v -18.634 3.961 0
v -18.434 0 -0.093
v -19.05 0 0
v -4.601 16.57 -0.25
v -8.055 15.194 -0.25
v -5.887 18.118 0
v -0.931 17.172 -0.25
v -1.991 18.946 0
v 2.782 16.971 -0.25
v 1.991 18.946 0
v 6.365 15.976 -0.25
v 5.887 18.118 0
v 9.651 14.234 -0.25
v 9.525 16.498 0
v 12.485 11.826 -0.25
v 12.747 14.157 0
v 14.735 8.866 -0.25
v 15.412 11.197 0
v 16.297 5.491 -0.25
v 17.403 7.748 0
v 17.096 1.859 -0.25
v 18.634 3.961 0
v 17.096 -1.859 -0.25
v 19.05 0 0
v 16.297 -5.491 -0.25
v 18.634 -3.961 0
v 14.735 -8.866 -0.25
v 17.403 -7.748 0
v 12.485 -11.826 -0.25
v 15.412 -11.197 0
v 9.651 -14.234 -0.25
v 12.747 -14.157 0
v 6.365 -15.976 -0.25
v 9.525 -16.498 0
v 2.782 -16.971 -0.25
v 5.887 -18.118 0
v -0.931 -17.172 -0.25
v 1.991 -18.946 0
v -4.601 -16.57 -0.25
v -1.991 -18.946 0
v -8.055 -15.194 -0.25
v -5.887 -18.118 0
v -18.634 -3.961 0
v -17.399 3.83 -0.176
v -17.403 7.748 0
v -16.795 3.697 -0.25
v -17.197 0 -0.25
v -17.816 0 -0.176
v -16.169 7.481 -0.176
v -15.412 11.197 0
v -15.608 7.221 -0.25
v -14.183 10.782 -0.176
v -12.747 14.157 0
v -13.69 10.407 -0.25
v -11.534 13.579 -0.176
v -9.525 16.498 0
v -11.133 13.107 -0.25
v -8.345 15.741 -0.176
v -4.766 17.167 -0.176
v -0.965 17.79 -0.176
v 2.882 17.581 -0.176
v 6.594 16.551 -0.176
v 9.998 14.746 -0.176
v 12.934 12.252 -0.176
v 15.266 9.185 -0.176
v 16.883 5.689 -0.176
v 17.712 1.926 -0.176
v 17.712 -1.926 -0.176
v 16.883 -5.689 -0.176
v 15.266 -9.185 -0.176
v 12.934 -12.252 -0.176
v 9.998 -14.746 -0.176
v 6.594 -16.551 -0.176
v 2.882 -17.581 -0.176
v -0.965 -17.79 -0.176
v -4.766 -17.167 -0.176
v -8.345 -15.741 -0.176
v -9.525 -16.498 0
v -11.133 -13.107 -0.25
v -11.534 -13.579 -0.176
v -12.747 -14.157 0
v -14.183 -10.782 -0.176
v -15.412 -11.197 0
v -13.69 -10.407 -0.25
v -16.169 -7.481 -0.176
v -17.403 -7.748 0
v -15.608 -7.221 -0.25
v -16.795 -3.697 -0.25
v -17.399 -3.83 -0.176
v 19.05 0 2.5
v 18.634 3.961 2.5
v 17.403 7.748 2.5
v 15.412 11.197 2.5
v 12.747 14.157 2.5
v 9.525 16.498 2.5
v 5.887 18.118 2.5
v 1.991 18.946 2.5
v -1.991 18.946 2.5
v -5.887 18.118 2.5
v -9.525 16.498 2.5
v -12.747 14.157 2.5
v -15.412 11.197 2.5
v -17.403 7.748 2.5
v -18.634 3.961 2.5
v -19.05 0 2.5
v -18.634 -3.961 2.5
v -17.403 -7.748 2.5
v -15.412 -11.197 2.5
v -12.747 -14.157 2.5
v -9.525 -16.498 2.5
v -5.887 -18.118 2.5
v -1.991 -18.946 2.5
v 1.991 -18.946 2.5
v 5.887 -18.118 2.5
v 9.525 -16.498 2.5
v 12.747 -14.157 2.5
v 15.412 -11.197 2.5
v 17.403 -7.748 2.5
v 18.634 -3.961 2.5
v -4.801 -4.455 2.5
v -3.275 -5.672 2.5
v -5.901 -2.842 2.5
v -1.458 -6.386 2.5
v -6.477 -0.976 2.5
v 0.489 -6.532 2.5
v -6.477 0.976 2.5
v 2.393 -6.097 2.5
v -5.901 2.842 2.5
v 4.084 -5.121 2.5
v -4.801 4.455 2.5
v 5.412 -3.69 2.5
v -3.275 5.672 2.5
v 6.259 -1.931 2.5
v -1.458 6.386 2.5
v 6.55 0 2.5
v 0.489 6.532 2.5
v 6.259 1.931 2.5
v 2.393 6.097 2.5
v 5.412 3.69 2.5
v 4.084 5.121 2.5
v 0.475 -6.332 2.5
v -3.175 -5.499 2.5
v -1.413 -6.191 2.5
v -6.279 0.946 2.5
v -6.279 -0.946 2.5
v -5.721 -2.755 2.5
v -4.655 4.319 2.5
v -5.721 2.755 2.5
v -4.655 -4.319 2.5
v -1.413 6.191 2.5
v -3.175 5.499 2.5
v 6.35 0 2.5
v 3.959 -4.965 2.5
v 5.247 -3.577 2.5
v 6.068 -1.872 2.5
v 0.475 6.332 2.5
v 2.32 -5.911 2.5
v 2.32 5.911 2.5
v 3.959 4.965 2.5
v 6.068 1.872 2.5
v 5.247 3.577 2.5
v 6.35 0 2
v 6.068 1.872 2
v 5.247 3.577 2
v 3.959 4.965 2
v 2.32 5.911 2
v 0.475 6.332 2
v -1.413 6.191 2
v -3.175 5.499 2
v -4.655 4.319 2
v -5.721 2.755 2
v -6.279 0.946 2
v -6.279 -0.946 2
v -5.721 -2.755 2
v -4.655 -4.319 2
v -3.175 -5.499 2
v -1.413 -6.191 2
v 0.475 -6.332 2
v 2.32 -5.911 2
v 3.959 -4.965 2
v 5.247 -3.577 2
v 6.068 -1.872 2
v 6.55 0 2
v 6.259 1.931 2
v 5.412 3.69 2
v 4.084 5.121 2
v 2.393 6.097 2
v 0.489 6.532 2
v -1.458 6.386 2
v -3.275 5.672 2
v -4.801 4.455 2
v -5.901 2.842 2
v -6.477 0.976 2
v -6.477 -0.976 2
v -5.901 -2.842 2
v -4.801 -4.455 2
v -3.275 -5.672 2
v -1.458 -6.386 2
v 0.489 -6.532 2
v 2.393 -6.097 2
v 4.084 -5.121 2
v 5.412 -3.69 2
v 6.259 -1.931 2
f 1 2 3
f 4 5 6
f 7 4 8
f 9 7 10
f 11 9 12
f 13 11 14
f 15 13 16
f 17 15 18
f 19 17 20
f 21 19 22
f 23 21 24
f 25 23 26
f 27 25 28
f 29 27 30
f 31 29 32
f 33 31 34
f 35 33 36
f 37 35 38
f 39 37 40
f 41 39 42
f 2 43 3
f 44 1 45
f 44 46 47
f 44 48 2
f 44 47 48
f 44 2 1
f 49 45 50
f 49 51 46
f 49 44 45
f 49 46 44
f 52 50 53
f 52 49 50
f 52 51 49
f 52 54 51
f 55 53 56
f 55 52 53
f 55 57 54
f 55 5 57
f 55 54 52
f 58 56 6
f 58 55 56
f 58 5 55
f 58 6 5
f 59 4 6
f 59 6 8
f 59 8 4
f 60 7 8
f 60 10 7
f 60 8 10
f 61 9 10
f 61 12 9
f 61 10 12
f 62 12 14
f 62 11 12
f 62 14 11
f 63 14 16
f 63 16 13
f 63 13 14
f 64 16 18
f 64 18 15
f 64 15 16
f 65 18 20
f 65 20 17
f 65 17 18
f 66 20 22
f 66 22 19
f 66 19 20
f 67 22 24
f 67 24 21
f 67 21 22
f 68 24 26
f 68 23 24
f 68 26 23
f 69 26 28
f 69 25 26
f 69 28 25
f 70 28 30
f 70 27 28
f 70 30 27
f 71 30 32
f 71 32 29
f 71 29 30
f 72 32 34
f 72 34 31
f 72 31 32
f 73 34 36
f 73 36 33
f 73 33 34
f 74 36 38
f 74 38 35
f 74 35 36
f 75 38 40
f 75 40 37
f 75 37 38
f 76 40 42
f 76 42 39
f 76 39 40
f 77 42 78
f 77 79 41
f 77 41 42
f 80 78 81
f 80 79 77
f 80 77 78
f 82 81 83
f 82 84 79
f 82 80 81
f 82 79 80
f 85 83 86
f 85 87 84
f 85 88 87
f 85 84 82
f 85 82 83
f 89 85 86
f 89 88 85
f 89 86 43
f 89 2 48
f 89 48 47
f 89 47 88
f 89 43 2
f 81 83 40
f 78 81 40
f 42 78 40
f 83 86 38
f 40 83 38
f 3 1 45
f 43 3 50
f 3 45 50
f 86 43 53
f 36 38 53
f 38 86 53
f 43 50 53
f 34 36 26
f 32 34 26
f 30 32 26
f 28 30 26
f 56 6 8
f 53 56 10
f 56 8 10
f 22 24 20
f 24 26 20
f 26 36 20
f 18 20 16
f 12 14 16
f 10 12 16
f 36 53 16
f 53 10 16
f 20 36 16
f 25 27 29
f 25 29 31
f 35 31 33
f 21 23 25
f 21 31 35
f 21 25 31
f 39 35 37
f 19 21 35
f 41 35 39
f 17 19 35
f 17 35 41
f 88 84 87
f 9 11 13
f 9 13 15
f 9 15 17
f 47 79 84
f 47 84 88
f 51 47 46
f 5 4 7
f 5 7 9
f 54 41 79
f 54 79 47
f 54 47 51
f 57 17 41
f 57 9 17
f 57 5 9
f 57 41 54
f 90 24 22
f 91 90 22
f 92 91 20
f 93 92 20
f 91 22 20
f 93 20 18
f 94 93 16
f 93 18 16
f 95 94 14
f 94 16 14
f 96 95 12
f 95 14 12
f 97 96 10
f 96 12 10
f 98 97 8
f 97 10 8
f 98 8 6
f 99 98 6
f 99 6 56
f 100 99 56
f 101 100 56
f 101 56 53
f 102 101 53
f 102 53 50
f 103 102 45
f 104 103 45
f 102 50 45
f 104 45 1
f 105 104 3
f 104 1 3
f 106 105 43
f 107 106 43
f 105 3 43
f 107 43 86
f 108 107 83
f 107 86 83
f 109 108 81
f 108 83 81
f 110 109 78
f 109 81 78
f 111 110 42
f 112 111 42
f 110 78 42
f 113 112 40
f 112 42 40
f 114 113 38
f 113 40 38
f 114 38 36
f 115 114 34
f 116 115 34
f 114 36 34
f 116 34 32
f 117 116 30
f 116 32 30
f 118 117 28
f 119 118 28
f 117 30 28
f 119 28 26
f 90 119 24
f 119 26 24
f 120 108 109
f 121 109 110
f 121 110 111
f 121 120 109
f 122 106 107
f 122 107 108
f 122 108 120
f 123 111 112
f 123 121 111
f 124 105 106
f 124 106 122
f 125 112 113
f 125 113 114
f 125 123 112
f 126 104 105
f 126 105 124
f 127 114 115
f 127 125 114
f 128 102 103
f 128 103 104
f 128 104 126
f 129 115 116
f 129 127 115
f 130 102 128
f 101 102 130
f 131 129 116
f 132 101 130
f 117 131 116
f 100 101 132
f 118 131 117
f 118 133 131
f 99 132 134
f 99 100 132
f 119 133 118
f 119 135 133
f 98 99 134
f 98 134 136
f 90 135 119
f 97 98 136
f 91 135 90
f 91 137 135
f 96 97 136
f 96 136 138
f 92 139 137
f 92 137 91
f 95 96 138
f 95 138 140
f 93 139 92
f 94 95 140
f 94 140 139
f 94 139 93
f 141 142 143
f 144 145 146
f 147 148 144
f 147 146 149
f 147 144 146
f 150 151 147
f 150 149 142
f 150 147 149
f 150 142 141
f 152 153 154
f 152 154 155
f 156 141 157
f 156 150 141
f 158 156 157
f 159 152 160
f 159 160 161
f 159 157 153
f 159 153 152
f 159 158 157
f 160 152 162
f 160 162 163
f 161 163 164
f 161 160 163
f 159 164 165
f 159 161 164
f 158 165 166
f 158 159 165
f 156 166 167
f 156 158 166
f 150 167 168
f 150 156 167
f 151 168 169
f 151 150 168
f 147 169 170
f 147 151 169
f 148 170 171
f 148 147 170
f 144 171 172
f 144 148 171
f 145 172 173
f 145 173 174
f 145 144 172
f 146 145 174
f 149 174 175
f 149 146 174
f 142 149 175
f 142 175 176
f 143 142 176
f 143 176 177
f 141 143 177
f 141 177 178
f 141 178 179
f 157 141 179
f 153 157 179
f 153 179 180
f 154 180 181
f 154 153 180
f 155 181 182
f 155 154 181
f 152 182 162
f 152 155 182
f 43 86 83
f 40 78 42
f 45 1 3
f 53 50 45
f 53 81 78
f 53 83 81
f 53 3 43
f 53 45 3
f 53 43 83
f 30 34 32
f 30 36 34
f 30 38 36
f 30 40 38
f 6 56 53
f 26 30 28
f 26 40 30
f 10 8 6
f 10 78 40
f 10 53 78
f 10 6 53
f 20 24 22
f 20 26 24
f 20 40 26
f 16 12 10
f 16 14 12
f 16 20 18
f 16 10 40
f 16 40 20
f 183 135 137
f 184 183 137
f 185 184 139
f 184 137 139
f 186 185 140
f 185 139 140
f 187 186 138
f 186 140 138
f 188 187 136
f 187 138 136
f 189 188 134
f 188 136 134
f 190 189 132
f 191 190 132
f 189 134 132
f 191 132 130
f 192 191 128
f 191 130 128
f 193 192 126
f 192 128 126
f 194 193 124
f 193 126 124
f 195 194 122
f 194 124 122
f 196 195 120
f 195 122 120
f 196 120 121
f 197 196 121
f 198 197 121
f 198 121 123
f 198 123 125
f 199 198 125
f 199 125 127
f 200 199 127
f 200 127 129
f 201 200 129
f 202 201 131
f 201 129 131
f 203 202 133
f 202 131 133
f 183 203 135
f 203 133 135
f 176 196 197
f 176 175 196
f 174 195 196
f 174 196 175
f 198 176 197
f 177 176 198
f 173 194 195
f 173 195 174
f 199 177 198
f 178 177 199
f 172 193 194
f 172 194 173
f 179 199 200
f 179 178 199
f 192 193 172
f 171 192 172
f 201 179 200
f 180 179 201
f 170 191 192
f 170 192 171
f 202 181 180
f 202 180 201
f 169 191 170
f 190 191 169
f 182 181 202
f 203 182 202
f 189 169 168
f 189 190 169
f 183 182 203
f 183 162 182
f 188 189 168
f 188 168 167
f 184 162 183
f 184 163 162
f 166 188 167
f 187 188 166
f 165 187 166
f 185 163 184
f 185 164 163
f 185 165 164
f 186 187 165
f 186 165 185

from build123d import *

# Parameters (mm, degrees)
F0_R     = 19.05
F1_DEPTH = 2.5
F2_R     = 6.55
F2_R_2   = 6.35
F3_DEPTH = 0.5


with BuildPart() as f1:
    # F0 (on Top) → F1 (new body)
    with BuildSketch(Plane.XY):
        Circle(F0_R)
    extrude(amount=F1_DEPTH)

    # F2 (on face) → F3 (cut)
    with BuildSketch(Plane.XY.offset(2.5)):
        Circle(F2_R)
        Circle(F2_R_2, mode=Mode.SUBTRACT)
    extrude(amount=-F3_DEPTH, mode=Mode.SUBTRACT)


with BuildPart() as f5:
    # F4 (on Front) → F5 (revolve)
    with BuildSketch(Plane.XZ):
        with BuildLine():
            Line((0, 0), (-19.05, 0))
            ThreePointArc((-19.05, 0), (-18.124981, -0.135675), (-17.197082, -0.25))
            Line((-17.197082, -0.25), (0, -0.25))
            Line((0, -0.25), (0, 0))
        make_face()
    revolve(axis=Axis((0, 0, -0.125), (0, 0, -1)))


solid = Compound([f1.part, f5.part])
